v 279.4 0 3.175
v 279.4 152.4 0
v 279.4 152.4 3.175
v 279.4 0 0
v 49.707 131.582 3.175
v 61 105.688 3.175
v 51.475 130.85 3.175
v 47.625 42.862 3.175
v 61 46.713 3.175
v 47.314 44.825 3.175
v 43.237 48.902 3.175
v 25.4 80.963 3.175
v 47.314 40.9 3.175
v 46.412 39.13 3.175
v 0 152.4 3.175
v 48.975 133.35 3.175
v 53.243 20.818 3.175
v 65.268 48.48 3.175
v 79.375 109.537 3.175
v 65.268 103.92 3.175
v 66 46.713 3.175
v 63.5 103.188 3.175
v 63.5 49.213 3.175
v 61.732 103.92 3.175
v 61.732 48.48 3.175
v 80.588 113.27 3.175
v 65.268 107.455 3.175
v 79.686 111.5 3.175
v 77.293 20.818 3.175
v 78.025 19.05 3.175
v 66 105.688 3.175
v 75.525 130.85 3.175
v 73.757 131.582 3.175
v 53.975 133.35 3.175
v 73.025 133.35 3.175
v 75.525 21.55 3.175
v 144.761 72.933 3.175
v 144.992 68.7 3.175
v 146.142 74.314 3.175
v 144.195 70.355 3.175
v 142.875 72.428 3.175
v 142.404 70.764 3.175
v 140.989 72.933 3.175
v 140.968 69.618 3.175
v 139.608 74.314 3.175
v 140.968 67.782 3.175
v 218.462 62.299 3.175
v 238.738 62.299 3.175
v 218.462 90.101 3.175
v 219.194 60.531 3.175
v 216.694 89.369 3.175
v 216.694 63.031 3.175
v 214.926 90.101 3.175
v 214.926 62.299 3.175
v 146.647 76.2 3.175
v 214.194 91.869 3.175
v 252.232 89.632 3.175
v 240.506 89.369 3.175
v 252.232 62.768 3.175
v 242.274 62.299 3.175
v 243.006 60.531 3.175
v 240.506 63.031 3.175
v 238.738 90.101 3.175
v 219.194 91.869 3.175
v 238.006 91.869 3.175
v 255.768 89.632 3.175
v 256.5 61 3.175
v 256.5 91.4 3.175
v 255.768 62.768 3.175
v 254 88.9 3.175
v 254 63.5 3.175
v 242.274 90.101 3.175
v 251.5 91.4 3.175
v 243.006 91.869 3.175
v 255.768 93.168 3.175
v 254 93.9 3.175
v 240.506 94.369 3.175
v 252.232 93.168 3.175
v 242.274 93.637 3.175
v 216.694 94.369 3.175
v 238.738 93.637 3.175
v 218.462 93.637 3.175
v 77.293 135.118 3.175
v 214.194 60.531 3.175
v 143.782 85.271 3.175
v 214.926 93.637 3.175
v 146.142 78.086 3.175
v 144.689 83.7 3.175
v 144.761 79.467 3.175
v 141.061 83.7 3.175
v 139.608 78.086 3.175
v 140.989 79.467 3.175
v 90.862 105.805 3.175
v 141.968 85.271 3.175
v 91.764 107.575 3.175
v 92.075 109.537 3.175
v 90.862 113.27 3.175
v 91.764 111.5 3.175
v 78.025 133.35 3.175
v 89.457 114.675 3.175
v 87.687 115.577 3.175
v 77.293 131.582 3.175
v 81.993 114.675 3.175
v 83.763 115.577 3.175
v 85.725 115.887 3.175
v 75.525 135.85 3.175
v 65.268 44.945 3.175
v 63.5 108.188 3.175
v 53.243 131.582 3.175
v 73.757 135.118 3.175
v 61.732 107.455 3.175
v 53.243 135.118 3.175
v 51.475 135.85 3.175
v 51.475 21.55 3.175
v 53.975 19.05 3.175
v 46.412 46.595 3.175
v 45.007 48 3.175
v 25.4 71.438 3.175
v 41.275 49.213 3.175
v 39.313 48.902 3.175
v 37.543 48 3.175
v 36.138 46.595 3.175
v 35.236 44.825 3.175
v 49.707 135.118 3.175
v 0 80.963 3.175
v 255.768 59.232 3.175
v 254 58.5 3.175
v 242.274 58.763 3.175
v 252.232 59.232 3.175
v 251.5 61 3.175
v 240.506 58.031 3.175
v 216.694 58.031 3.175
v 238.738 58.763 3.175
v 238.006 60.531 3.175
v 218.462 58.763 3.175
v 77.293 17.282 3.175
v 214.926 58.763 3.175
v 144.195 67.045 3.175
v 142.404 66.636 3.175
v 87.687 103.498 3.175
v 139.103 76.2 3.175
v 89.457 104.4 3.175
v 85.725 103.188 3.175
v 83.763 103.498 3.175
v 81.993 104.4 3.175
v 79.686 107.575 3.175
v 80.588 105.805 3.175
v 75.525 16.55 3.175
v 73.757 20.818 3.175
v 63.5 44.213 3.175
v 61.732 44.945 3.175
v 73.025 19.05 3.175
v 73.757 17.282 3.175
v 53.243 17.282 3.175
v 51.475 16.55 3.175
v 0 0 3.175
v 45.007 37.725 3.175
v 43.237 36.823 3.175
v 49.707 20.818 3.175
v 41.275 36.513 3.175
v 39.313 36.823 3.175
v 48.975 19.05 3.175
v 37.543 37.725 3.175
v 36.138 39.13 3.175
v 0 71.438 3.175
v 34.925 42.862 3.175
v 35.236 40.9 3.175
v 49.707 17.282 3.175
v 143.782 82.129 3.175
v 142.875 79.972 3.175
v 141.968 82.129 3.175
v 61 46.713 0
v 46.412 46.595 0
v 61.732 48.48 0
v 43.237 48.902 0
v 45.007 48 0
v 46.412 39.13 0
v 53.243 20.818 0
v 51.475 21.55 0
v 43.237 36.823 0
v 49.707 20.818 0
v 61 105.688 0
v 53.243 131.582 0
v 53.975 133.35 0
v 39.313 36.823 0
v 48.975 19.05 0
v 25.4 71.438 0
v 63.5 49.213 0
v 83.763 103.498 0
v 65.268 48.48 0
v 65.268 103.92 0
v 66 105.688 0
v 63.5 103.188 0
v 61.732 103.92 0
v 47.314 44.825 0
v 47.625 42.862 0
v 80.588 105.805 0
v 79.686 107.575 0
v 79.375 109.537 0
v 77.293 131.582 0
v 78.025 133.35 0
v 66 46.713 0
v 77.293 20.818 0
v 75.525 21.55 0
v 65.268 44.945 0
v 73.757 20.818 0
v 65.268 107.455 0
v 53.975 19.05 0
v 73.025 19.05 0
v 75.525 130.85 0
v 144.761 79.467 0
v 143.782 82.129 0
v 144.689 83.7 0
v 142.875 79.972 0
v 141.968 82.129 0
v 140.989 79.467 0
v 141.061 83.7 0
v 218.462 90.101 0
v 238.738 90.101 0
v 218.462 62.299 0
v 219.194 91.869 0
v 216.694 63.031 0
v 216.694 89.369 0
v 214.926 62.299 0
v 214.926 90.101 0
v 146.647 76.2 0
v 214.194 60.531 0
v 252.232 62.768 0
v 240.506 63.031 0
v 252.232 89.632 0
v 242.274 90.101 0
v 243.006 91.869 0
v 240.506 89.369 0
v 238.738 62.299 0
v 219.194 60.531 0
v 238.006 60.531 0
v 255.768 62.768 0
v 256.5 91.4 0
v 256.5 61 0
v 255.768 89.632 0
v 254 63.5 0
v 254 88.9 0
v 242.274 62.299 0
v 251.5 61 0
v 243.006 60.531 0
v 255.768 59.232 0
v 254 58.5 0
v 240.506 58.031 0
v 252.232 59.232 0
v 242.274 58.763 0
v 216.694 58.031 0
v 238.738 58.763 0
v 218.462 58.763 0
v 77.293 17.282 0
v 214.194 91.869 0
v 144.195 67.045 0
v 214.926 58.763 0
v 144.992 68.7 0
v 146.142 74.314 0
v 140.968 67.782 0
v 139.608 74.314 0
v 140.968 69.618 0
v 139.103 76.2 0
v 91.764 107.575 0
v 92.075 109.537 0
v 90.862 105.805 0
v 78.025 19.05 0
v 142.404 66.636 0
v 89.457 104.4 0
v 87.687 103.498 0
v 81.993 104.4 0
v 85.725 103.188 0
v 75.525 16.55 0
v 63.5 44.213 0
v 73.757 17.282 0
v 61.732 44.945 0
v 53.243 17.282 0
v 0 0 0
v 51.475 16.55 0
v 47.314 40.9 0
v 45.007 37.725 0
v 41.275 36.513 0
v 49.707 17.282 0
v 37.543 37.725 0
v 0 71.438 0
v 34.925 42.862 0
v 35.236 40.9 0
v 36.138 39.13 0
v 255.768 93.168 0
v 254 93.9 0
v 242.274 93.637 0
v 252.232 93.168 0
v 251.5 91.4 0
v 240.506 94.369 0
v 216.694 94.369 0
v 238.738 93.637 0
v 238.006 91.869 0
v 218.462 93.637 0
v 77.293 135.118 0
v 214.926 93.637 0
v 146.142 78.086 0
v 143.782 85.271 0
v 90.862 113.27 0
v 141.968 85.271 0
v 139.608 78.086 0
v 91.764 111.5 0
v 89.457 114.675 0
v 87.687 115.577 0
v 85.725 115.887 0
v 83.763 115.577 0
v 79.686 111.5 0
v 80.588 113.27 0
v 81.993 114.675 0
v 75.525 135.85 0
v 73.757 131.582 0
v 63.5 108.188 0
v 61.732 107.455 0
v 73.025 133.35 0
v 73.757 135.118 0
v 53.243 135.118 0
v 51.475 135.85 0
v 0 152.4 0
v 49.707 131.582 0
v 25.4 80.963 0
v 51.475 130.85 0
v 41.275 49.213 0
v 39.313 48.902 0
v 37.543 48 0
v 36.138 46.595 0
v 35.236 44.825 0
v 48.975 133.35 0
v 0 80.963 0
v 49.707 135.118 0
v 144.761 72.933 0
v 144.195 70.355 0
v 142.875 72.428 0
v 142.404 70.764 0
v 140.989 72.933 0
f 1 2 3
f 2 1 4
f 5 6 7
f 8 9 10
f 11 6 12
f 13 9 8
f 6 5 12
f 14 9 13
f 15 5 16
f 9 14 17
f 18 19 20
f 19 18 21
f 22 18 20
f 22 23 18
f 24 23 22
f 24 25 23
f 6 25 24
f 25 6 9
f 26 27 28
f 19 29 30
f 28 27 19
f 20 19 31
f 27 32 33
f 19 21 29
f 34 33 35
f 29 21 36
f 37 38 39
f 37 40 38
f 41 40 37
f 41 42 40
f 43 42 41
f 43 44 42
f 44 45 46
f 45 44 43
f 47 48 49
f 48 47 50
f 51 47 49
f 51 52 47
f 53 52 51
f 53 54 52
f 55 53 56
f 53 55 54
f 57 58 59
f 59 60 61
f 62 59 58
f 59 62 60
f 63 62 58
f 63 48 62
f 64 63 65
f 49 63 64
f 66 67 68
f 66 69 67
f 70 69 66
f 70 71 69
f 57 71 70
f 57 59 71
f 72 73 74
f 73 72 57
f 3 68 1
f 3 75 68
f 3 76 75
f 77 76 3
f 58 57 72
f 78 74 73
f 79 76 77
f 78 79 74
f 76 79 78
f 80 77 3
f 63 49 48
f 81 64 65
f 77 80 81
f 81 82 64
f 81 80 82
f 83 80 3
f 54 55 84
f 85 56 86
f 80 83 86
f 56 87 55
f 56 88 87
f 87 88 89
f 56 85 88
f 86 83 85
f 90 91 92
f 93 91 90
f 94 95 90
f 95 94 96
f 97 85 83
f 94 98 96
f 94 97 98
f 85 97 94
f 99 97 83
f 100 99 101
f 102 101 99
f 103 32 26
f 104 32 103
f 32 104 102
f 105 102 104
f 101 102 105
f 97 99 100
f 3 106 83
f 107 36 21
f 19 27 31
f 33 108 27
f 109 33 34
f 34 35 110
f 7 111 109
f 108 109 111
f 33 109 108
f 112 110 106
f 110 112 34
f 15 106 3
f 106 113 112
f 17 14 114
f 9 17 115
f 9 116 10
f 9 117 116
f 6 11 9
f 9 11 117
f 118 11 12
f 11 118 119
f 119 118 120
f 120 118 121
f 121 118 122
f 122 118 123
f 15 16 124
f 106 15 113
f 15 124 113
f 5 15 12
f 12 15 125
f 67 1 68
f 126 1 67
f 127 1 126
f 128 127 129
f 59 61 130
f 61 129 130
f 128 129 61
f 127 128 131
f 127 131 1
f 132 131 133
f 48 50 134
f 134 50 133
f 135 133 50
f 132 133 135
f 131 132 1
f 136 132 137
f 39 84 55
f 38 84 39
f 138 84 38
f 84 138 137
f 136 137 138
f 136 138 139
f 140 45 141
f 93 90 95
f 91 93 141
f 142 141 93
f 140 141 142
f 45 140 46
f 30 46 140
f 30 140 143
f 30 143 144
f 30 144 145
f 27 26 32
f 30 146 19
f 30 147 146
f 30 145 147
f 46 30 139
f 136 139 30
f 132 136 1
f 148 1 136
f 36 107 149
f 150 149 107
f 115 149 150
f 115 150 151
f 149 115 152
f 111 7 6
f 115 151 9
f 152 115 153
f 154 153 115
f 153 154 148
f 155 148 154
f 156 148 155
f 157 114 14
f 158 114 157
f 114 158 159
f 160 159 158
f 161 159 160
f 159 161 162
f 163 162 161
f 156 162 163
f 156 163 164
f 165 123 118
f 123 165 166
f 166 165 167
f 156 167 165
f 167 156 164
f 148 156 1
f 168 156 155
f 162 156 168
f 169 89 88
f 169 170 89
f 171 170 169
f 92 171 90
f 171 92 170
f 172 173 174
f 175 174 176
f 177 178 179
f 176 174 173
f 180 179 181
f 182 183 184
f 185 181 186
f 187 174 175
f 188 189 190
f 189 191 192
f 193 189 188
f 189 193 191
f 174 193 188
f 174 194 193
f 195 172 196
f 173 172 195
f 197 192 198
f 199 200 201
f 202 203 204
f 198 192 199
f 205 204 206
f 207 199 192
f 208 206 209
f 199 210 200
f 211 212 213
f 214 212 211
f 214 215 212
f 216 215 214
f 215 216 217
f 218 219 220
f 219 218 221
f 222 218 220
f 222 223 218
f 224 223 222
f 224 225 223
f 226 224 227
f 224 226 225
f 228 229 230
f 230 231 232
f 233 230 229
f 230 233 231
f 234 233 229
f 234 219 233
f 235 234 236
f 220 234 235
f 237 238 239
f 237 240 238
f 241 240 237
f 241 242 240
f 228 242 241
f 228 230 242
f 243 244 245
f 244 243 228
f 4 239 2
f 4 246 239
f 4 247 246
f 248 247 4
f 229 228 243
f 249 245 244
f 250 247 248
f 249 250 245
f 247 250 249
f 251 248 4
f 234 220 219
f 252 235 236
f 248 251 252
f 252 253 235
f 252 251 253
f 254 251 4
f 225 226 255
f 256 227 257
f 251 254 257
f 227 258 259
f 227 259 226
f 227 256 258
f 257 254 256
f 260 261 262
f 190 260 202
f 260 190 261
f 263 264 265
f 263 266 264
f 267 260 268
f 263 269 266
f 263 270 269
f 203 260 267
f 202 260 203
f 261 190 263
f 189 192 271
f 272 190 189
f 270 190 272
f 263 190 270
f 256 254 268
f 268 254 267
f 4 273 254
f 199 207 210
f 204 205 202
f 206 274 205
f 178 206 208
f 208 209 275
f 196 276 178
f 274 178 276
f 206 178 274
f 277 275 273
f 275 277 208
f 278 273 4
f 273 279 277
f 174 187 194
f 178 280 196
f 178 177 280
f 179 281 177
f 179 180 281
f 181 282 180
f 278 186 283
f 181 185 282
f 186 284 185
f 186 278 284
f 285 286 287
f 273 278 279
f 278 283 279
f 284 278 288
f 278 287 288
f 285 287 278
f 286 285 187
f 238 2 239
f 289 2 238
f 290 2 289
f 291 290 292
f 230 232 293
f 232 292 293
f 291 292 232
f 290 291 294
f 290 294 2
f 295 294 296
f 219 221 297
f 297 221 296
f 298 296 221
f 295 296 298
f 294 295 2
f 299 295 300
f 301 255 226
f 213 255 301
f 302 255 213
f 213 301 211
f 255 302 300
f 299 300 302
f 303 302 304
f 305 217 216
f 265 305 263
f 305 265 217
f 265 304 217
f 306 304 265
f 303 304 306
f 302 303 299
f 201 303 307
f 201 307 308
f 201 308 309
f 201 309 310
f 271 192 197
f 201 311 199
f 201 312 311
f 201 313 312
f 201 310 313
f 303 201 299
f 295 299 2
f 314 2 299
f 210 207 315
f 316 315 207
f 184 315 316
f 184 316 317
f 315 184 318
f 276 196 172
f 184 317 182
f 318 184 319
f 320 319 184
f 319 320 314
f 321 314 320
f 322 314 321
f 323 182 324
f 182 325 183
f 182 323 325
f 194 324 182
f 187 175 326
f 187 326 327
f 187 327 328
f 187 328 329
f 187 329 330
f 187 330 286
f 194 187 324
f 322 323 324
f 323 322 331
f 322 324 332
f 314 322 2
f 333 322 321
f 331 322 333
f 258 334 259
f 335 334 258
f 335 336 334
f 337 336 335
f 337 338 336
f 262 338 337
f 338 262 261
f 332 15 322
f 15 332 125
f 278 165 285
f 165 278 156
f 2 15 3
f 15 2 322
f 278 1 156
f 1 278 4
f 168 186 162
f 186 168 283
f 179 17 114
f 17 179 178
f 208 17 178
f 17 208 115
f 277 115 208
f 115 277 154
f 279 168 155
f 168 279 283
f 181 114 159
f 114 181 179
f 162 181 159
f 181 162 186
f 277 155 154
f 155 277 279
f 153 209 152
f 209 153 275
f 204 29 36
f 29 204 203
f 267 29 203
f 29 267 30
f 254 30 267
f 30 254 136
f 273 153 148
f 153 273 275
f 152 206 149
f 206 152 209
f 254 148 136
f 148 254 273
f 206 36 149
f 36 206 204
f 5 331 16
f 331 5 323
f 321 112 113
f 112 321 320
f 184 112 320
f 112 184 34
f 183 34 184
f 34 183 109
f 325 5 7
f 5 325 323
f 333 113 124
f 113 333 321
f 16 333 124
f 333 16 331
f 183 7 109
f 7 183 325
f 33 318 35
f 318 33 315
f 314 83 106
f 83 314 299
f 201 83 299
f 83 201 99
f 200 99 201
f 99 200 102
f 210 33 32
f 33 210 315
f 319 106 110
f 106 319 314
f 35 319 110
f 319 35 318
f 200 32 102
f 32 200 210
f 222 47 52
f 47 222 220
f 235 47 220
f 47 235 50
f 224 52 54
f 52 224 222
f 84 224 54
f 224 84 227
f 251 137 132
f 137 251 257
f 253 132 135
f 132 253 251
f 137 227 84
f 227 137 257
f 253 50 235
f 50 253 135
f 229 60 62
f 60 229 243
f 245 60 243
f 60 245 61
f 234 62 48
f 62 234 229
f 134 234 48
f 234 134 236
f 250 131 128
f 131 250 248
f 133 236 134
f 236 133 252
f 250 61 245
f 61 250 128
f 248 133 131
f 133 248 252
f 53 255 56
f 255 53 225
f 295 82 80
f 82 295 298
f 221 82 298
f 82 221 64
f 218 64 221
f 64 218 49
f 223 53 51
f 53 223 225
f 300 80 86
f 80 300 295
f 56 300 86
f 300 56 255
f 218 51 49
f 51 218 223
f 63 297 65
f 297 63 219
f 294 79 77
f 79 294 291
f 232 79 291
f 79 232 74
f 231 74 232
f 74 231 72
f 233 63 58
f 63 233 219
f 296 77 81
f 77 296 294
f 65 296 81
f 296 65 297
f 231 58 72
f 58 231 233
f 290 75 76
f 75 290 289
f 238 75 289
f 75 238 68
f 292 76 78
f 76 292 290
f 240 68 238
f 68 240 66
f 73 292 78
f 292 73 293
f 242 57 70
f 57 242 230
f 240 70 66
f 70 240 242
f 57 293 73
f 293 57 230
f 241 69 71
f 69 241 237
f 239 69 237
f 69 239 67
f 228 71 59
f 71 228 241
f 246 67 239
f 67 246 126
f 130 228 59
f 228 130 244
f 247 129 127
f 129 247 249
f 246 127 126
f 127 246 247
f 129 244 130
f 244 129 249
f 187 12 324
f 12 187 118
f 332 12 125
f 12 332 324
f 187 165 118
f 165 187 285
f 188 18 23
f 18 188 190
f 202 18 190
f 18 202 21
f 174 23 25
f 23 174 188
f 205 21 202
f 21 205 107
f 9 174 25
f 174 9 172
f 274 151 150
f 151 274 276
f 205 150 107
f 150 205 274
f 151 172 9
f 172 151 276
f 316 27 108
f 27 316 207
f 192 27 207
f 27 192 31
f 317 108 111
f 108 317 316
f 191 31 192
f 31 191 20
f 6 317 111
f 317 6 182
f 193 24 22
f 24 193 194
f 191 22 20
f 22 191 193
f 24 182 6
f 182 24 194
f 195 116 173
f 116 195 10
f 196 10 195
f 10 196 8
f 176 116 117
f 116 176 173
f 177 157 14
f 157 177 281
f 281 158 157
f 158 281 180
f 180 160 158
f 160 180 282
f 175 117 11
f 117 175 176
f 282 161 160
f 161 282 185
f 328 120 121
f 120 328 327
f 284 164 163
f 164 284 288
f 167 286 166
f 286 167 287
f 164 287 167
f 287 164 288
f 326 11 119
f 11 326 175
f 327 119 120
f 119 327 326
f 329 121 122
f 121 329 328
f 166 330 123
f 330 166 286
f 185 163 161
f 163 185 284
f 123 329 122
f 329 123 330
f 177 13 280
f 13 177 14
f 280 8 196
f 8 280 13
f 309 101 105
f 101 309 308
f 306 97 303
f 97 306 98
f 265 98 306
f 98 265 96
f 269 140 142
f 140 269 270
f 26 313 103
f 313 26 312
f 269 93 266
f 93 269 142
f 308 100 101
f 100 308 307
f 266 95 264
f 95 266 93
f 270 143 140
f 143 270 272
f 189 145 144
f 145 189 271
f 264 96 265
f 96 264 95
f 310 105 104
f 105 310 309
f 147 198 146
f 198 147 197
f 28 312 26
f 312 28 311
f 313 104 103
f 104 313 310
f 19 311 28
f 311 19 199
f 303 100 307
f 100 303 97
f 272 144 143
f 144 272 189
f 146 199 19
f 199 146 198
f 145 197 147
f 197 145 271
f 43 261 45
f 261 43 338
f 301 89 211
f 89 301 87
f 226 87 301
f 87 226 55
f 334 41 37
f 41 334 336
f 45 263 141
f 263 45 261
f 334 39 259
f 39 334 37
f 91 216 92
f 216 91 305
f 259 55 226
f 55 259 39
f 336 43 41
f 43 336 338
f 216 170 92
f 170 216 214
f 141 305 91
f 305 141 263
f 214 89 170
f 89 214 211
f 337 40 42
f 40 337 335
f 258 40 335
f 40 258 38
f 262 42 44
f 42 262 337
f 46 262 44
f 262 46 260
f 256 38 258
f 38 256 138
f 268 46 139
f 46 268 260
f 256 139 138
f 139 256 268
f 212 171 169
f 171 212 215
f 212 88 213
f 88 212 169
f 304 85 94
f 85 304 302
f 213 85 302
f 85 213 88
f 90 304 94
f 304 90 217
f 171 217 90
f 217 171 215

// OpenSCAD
$inch = 25.4;
$half = $inch/2;
$quarter = $inch/4;
$eigth = $inch/8;
$sixteenth = $inch/16;
$thirtysecondth = $inch/32;

$add_to_tail = 0;

$zip_tie_hole_r = 2.5;

$plate_thickness = 3; // millimeters
$plate_long =              (11.00 + $add_to_tail) * $inch;    
$plate_wide =               6.00 * $inch;
$axle_offset_from_front =   (2.50 + $add_to_tail) * $inch;
$rear_wheel_offset_ff =     (9.00 + $add_to_tail) * $inch;

$gear_box_f2b =             0.75 * $inch;
$gear_box_s2s =             1.00 * $inch;
$gear_box_ledge =           0.50 * $inch;

$r_wheel_base_w =        (1 + 5/8) * $inch;
$r_wheel_base_l =        (1 + 1/4) * $inch;
$bread_board_w =         (2 + 1/8) * $inch;
$bread_board_l =         (3 + 1/4) * $inch;

$hole_offset_from_center_w = 
                       $r_wheel_base_w/2 - (5/32 * $inch) -1;
$hole_offset_from_center_l = 
                       $r_wheel_base_l/2 - (5/32 * $inch);

$battery_offset_ff =           (10 + $add_to_tail) * $inch;
$battery_w =                    1 * $inch;

$sense_slot_l = 1 * $inch;
$sense_slot_w = 3/8 * $inch;

$wire_port_r = 1/4 * $inch;

$potentiometer_offset_ff = $axle_offset_from_front 
                           + $bread_board_l/2 
                           + 1.5 * $inch;
$potentiometer_hole_r = (9/32 * $inch / 2) + 0.2;
                 

module base_plate (length, width) {

   difference () {
      translate([0,0,0]) {
         cube([length, width, $eigth]);
      }
      // left gearbox zip tie holes
      // front  (The zip tie hole radius in the first coord
      // is so that the whole hole is out from under the 
      // fitting
      translate([$axle_offset_from_front - $gear_box_f2b/2
                 - $zip_tie_hole_r,
                 $gear_box_s2s - $gear_box_ledge/2,
                 -1]) {
         cylinder(r=$zip_tie_hole_r, h=$plate_thickness + 2);
      }
      // back
      translate([$axle_offset_from_front + $gear_box_f2b/2
                 + $zip_tie_hole_r,
                 $gear_box_s2s - $gear_box_ledge/2,
                 -1]) {
         cylinder(r=$zip_tie_hole_r, h=$plate_thickness + 2);
      }
      // right gearbox zip tie holes
      // front
      translate([$axle_offset_from_front - $gear_box_f2b/2
                  - $zip_tie_hole_r,
                 width - $gear_box_s2s + $gear_box_ledge/2,
                 -1]) {
         cylinder(r=$zip_tie_hole_r, h=$plate_thickness + 2);
      }
      // back
      translate([$axle_offset_from_front + $gear_box_f2b/2
                 + $zip_tie_hole_r,
                 width - $gear_box_s2s + $gear_box_ledge/2,
                 -1]) {
         cylinder(r=$zip_tie_hole_r, h=$plate_thickness + 2);
      }
   // back wheel ziptie holes
    // left front
      translate([$rear_wheel_offset_ff
                   - $hole_offset_from_center_l,
                 width/2 - $hole_offset_from_center_w,
                 -1]) {
         cylinder(r=$zip_tie_hole_r, h=$plate_thickness + 2);
      }

      translate([$rear_wheel_offset_ff 
                   + $hole_offset_from_center_l,
                 width/2 - $hole_offset_from_center_w,
                 -1]) {
         cylinder(r=$zip_tie_hole_r, h=$plate_thickness + 2);
      }
      translate([$rear_wheel_offset_ff
                   - $hole_offset_from_center_l,
                 width/2 + $hole_offset_from_center_w,
                 -1]) {
         cylinder(r=$zip_tie_hole_r, h=$plate_thickness + 2);
      }
      translate([$rear_wheel_offset_ff
                   + $hole_offset_from_center_l,
                 width/2 + $hole_offset_from_center_w,
                 -1]) {
         cylinder(r=$zip_tie_hole_r, h=$plate_thickness + 2);
      }
      // battery holes
      translate([$battery_offset_ff,
                 width/2 + $battery_w/2 + $zip_tie_hole_r,
                 -1]) {
         cylinder(r=$zip_tie_hole_r, h=$plate_thickness + 2);
      }
      translate([$battery_offset_ff,  
                 width/2 - $battery_w/2 - $zip_tie_hole_r ,
                 -1]) {
         cylinder(r=$zip_tie_hole_r, h=$plate_thickness + 2);
      }
      // slot for sensor wire cardboard
      translate([0,  
                 width/2 - $sense_slot_w/2,
                 -1]) {
         cube([$sense_slot_l, 
               $sense_slot_w, 
               $plate_thickness + 2]);
      }
      // zip tie holes for breadboard
      translate([$axle_offset_from_front,  
                 width/2 - $bread_board_w/2 
                    - $zip_tie_hole_r ,
                 -1]) {
         cylinder(r=$zip_tie_hole_r, h=$plate_thickness + 2);
      }
      translate([$axle_offset_from_front,  
                 width/2 + $bread_board_w/2 
                    + $zip_tie_hole_r ,
                 -1]) {
         cylinder(r=$zip_tie_hole_r, h=$plate_thickness + 2);
      }
      // wire port for motor wire
      translate([$axle_offset_from_front - $bread_board_l/2 
                   + 3/4 * $inch,  
                 width/2 - $bread_board_w/2 - $wire_port_r,
                 -1]) {
         cylinder(r=$wire_port_r, 
                  h=$plate_thickness + 2);
      }
      // wire port for potentiometer wire
      translate([$axle_offset_from_front + $bread_board_l/2 
                   - 3/4 * $inch,  
                 width/2 + $bread_board_w/2 + $wire_port_r,
                 -1]) {
         cylinder(r=$wire_port_r, 
                  h=$plate_thickness + 2);
      }

/*    //bread board position
      translate([$axle_offset_from_front - $bread_board_l/2,  
                 width/2 - $bread_board_w/2,
                 -1]) {
         cube([$bread_board_l, 
               $bread_board_w, 
               $plate_thickness + 2]);
      }      
*/
      // potentiometer mounting hole
      translate([$potentiometer_offset_ff,  
                 width/2,
                 -1]) {
         cylinder(r=$potentiometer_hole_r, h=$plate_thickness + 2);
      }
      // and potentiometer retaining pin holes
      translate([$potentiometer_offset_ff,  
                 width/2 - 7.5,
                 -1]) {
         cylinder(r=$inch/12, h=$plate_thickness + 2);
      }
      translate([$potentiometer_offset_ff,  
                 width/2 + 7.5,
                 -1]) {
         cylinder(r=$inch/14, h=$plate_thickness + 2);
      }
   }
}

$2d = 0;
if ($2d) {
    projection(cut=true) {
       translate([0,0,0]) rotate([0,0,0]) {
          base_plate($plate_long, $plate_wide);
       }
    }
} else {
   translate([0,0,0]) rotate([0,0,0]) {
      base_plate($plate_long, $plate_wide);
   }
}
